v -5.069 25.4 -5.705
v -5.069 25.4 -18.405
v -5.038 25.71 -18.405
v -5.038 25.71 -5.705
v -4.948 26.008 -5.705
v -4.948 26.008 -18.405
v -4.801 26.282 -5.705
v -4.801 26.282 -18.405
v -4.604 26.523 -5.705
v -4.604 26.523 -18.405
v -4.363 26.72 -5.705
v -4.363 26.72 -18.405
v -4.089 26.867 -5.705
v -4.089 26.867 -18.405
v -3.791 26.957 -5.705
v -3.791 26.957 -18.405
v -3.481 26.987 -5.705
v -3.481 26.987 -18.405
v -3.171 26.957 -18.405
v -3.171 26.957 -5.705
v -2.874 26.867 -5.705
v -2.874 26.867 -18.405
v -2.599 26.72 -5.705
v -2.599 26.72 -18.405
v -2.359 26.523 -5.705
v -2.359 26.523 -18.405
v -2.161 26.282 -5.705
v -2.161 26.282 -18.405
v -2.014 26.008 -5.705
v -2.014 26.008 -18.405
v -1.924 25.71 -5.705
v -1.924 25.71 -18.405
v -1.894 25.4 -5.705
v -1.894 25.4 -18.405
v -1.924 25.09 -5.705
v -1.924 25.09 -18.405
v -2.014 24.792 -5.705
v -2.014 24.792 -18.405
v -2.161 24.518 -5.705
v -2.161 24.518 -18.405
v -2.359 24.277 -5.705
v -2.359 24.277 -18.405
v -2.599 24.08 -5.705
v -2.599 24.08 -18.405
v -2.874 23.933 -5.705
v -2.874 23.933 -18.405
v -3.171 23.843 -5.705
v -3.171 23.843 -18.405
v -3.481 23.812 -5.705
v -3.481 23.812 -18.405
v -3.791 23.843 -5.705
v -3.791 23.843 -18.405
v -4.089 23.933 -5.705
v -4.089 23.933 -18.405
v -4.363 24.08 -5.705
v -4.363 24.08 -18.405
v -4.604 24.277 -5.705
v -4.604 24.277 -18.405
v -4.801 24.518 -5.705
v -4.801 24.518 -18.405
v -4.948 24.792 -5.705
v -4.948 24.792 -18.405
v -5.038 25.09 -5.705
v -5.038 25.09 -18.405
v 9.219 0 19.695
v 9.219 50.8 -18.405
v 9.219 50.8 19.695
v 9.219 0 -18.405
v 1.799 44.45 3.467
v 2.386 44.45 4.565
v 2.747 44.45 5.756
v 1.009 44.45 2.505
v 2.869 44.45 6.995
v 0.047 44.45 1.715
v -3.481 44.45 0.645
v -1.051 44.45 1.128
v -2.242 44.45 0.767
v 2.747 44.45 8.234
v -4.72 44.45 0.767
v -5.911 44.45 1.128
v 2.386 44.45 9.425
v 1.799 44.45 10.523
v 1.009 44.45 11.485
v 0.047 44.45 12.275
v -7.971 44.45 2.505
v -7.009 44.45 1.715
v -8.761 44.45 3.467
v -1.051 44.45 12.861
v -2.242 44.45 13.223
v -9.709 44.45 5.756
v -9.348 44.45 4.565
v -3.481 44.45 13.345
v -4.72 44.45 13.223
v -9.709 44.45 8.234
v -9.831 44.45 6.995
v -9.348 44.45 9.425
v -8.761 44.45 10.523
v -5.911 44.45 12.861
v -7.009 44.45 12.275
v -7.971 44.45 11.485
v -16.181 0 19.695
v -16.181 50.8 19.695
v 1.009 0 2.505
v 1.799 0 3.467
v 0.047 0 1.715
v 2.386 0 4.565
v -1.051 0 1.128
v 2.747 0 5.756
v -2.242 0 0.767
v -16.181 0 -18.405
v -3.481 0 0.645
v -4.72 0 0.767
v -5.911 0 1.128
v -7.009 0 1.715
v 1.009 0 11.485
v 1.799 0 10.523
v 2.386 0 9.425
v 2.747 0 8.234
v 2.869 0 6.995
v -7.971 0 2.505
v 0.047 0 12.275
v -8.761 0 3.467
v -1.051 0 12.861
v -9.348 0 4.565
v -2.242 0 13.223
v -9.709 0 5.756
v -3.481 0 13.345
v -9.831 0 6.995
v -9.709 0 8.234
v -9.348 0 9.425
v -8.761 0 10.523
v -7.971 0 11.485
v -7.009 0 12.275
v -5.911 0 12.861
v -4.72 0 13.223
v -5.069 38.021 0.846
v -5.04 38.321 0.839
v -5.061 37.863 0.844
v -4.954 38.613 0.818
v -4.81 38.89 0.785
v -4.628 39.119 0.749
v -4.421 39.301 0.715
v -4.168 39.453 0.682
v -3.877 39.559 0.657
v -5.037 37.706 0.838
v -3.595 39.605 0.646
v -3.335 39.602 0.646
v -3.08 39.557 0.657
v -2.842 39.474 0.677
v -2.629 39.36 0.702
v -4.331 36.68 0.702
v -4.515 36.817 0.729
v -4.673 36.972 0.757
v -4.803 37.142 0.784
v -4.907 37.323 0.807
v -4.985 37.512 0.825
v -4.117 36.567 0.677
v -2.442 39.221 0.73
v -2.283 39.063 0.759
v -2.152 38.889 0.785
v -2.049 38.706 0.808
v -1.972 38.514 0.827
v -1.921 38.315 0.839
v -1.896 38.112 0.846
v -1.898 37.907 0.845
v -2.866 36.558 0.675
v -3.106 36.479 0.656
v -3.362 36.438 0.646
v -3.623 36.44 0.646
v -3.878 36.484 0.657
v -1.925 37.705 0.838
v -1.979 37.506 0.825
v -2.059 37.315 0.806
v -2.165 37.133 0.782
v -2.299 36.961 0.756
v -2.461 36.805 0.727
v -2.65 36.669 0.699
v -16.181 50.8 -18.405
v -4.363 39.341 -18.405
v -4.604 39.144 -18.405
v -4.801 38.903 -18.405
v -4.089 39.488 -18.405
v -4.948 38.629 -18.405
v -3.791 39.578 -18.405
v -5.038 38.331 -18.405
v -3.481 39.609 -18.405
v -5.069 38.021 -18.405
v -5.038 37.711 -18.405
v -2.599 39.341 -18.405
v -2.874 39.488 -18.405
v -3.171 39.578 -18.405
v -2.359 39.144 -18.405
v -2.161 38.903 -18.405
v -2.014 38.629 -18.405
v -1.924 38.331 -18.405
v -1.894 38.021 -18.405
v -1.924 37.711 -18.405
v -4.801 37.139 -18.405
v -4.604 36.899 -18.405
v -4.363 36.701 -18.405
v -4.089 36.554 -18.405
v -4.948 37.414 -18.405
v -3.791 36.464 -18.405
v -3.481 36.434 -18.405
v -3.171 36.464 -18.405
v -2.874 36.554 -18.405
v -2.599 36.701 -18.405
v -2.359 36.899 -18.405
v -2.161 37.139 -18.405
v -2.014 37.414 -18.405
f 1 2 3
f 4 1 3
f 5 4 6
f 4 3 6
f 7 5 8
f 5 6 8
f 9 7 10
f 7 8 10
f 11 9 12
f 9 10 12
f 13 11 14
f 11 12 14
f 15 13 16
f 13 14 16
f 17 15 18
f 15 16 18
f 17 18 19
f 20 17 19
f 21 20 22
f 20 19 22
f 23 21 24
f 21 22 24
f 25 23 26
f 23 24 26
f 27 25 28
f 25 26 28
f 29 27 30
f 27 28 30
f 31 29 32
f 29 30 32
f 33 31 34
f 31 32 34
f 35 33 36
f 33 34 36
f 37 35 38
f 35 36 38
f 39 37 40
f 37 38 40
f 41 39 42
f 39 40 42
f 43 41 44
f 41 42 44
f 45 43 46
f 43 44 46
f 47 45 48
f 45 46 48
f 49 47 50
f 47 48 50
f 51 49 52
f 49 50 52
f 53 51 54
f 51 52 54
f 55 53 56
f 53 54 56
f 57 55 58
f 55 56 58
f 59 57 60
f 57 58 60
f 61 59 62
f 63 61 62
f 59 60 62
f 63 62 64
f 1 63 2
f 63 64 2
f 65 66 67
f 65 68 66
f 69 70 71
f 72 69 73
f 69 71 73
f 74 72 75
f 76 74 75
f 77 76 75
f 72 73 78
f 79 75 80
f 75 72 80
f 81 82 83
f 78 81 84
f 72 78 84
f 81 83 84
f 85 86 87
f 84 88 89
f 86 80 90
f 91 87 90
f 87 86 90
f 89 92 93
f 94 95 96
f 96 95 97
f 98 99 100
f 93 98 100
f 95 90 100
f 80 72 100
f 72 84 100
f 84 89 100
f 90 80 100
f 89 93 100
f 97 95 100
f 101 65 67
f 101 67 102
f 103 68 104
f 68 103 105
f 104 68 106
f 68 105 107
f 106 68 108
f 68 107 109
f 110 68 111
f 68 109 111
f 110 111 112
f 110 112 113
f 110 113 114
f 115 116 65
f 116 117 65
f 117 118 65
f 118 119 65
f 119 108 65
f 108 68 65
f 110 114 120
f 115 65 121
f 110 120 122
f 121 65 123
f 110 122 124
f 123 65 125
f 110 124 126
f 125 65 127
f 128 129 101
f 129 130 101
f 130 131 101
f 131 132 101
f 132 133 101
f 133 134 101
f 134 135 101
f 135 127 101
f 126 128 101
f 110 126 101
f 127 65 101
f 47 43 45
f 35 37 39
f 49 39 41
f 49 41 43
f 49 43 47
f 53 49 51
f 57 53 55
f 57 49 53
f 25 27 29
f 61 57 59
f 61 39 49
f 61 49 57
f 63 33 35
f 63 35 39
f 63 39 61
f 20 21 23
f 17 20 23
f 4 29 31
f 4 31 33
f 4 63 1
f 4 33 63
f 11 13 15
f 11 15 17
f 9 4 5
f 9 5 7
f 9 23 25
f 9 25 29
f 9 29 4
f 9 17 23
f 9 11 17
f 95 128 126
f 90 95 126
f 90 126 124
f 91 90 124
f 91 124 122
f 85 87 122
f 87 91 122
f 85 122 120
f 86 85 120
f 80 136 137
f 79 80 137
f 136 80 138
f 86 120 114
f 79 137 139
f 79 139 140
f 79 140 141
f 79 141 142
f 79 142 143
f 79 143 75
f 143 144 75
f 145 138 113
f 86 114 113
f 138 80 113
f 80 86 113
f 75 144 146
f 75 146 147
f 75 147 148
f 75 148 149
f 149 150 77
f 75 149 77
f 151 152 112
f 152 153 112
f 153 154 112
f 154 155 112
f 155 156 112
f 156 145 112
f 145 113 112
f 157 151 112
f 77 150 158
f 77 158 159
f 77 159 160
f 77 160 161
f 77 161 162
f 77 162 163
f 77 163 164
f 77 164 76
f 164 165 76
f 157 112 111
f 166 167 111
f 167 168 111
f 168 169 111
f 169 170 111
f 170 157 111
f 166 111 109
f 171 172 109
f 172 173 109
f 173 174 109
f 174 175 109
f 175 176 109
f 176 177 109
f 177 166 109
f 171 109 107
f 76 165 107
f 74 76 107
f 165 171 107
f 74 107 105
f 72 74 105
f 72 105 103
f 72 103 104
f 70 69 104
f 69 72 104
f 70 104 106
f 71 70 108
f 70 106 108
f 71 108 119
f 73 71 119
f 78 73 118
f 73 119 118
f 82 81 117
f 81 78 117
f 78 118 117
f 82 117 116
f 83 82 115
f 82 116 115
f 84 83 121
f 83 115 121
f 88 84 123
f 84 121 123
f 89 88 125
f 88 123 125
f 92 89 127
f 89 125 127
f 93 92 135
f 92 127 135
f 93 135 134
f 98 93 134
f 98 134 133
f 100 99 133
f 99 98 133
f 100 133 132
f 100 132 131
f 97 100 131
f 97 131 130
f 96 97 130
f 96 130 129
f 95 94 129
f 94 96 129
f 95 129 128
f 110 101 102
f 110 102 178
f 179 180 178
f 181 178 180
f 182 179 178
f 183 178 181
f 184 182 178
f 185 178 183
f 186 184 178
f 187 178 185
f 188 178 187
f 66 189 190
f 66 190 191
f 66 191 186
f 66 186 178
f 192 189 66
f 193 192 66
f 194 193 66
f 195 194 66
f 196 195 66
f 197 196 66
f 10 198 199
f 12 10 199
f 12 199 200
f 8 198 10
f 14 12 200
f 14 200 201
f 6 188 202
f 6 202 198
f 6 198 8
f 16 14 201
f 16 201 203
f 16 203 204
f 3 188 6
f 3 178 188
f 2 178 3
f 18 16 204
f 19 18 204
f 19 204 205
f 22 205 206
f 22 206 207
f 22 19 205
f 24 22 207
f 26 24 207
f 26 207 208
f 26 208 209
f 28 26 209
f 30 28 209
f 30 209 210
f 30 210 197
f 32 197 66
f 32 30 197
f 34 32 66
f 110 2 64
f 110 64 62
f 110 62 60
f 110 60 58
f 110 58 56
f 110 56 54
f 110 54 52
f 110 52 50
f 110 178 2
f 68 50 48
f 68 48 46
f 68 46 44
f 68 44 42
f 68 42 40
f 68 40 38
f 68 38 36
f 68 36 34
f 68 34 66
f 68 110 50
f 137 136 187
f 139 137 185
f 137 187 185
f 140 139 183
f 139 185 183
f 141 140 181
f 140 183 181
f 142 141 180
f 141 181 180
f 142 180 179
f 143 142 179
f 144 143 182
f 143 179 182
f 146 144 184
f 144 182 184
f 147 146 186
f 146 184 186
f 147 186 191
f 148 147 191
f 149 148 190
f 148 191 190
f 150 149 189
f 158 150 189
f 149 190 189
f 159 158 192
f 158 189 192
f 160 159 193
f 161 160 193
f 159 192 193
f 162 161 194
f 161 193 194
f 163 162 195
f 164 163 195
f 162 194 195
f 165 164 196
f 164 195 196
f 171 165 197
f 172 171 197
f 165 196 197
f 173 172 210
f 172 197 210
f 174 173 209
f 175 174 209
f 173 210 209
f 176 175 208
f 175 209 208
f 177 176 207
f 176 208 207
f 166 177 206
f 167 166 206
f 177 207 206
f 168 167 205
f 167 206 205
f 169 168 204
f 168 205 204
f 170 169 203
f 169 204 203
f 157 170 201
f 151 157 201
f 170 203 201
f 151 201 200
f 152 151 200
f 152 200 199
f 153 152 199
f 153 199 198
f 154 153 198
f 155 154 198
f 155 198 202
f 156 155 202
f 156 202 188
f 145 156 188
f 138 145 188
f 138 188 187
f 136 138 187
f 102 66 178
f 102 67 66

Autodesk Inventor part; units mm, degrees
ref_plane "YZ Plane" through (0, 0, 0) normal (1, 0, 0) x (0, 1, 0)
ref_plane "XZ Plane" through (0, 0, 0) normal (0, 1, 0) x (-1, 0, 0)
ref_plane "XY Plane" through (0, 0, 0) normal (0, 0, 1) x (1, 0, 0)
sketch "Sketch1" plane through (0, 0, 0) normal (0, 1, 0) x (-1, 0, 0)
  circle A0 centre (3.4811, 6.9947) radius 6.35
  line L0 (-9.2189, 19.6947) -> (16.1811, 19.6947)
  line L1 (16.1811, 19.6947) -> (16.1811, -18.4053)
  line L2 (16.1811, -18.4053) -> (-9.2189, -18.4053)
  line L3 (-9.2189, -18.4053) -> (-9.2189, 19.6947)
  point P0 (0, 0)
  dimension "d0" = 12.7
  dimension "d1" = 25.4
  dimension "d2" = 38.1
  dimension "d3" = 12.7
  dimension "d4" = 12.7
extrude "Extrusion1" add sketch "Sketch1" along normal blind 50.8 contours A0 | L0 L1 L2 L3
extrude "Extrusion4" cut sketch "Sketch1" along normal blind 44.45 contours A0
sketch "Sketch3" plane through (9.2189, 0, -18.4053) normal (0, 0, -1) x (-1, 0, 0)
  line L0 (25.4, 0) -> (0, 0) projected
  line L1 (12.7, 0) -> (12.7, 50.8)
  line L2 (0, 50.8) -> (25.4, 50.8) projected
  circle A0 centre (12.7, 25.4) radius 1.5875
  circle A1 centre (12.7, 38.1) radius 1.5875
  point P0 (9.2189, 0)
  dimension "d23" = 3.175
  dimension "d24" = 3.175
  dimension "d25" = 25.4
  dimension "d26" = 12.7
extrude "Extrusion5" cut sketch "Sketch3" against normal blind 12.7 contours A0 L1 | L1 A0
sketch "Sketch4" plane through (9.2189, -0.0789, -18.4053) normal (0, 0, -1) x (-1, 0, 0)
  line L0 (25.4, 0) -> (0, 0)
  line L1 (12.7, 0) -> (12.7, 50.8)
  line L2 (0, 50.8) -> (25.4, 50.8)
  circle A0 centre (12.7, 25.4) radius 1.5875
  circle A1 centre (12.7, 38.1) radius 1.5875
  point P0 (9.2189, 0)
  point P1 (12.7, 39.6875)
  point P2 (12.7, 36.5125)
  dimension "d30" = 3.175
  dimension "d31" = 3.175
  dimension "d32" = 25.4
  dimension "d29" = 12.7
extrude "Extrusion6" cut sketch "Sketch4" against normal blind 25.4 contours A1 L1 | L1 A1
properties part number "Cylinder"
